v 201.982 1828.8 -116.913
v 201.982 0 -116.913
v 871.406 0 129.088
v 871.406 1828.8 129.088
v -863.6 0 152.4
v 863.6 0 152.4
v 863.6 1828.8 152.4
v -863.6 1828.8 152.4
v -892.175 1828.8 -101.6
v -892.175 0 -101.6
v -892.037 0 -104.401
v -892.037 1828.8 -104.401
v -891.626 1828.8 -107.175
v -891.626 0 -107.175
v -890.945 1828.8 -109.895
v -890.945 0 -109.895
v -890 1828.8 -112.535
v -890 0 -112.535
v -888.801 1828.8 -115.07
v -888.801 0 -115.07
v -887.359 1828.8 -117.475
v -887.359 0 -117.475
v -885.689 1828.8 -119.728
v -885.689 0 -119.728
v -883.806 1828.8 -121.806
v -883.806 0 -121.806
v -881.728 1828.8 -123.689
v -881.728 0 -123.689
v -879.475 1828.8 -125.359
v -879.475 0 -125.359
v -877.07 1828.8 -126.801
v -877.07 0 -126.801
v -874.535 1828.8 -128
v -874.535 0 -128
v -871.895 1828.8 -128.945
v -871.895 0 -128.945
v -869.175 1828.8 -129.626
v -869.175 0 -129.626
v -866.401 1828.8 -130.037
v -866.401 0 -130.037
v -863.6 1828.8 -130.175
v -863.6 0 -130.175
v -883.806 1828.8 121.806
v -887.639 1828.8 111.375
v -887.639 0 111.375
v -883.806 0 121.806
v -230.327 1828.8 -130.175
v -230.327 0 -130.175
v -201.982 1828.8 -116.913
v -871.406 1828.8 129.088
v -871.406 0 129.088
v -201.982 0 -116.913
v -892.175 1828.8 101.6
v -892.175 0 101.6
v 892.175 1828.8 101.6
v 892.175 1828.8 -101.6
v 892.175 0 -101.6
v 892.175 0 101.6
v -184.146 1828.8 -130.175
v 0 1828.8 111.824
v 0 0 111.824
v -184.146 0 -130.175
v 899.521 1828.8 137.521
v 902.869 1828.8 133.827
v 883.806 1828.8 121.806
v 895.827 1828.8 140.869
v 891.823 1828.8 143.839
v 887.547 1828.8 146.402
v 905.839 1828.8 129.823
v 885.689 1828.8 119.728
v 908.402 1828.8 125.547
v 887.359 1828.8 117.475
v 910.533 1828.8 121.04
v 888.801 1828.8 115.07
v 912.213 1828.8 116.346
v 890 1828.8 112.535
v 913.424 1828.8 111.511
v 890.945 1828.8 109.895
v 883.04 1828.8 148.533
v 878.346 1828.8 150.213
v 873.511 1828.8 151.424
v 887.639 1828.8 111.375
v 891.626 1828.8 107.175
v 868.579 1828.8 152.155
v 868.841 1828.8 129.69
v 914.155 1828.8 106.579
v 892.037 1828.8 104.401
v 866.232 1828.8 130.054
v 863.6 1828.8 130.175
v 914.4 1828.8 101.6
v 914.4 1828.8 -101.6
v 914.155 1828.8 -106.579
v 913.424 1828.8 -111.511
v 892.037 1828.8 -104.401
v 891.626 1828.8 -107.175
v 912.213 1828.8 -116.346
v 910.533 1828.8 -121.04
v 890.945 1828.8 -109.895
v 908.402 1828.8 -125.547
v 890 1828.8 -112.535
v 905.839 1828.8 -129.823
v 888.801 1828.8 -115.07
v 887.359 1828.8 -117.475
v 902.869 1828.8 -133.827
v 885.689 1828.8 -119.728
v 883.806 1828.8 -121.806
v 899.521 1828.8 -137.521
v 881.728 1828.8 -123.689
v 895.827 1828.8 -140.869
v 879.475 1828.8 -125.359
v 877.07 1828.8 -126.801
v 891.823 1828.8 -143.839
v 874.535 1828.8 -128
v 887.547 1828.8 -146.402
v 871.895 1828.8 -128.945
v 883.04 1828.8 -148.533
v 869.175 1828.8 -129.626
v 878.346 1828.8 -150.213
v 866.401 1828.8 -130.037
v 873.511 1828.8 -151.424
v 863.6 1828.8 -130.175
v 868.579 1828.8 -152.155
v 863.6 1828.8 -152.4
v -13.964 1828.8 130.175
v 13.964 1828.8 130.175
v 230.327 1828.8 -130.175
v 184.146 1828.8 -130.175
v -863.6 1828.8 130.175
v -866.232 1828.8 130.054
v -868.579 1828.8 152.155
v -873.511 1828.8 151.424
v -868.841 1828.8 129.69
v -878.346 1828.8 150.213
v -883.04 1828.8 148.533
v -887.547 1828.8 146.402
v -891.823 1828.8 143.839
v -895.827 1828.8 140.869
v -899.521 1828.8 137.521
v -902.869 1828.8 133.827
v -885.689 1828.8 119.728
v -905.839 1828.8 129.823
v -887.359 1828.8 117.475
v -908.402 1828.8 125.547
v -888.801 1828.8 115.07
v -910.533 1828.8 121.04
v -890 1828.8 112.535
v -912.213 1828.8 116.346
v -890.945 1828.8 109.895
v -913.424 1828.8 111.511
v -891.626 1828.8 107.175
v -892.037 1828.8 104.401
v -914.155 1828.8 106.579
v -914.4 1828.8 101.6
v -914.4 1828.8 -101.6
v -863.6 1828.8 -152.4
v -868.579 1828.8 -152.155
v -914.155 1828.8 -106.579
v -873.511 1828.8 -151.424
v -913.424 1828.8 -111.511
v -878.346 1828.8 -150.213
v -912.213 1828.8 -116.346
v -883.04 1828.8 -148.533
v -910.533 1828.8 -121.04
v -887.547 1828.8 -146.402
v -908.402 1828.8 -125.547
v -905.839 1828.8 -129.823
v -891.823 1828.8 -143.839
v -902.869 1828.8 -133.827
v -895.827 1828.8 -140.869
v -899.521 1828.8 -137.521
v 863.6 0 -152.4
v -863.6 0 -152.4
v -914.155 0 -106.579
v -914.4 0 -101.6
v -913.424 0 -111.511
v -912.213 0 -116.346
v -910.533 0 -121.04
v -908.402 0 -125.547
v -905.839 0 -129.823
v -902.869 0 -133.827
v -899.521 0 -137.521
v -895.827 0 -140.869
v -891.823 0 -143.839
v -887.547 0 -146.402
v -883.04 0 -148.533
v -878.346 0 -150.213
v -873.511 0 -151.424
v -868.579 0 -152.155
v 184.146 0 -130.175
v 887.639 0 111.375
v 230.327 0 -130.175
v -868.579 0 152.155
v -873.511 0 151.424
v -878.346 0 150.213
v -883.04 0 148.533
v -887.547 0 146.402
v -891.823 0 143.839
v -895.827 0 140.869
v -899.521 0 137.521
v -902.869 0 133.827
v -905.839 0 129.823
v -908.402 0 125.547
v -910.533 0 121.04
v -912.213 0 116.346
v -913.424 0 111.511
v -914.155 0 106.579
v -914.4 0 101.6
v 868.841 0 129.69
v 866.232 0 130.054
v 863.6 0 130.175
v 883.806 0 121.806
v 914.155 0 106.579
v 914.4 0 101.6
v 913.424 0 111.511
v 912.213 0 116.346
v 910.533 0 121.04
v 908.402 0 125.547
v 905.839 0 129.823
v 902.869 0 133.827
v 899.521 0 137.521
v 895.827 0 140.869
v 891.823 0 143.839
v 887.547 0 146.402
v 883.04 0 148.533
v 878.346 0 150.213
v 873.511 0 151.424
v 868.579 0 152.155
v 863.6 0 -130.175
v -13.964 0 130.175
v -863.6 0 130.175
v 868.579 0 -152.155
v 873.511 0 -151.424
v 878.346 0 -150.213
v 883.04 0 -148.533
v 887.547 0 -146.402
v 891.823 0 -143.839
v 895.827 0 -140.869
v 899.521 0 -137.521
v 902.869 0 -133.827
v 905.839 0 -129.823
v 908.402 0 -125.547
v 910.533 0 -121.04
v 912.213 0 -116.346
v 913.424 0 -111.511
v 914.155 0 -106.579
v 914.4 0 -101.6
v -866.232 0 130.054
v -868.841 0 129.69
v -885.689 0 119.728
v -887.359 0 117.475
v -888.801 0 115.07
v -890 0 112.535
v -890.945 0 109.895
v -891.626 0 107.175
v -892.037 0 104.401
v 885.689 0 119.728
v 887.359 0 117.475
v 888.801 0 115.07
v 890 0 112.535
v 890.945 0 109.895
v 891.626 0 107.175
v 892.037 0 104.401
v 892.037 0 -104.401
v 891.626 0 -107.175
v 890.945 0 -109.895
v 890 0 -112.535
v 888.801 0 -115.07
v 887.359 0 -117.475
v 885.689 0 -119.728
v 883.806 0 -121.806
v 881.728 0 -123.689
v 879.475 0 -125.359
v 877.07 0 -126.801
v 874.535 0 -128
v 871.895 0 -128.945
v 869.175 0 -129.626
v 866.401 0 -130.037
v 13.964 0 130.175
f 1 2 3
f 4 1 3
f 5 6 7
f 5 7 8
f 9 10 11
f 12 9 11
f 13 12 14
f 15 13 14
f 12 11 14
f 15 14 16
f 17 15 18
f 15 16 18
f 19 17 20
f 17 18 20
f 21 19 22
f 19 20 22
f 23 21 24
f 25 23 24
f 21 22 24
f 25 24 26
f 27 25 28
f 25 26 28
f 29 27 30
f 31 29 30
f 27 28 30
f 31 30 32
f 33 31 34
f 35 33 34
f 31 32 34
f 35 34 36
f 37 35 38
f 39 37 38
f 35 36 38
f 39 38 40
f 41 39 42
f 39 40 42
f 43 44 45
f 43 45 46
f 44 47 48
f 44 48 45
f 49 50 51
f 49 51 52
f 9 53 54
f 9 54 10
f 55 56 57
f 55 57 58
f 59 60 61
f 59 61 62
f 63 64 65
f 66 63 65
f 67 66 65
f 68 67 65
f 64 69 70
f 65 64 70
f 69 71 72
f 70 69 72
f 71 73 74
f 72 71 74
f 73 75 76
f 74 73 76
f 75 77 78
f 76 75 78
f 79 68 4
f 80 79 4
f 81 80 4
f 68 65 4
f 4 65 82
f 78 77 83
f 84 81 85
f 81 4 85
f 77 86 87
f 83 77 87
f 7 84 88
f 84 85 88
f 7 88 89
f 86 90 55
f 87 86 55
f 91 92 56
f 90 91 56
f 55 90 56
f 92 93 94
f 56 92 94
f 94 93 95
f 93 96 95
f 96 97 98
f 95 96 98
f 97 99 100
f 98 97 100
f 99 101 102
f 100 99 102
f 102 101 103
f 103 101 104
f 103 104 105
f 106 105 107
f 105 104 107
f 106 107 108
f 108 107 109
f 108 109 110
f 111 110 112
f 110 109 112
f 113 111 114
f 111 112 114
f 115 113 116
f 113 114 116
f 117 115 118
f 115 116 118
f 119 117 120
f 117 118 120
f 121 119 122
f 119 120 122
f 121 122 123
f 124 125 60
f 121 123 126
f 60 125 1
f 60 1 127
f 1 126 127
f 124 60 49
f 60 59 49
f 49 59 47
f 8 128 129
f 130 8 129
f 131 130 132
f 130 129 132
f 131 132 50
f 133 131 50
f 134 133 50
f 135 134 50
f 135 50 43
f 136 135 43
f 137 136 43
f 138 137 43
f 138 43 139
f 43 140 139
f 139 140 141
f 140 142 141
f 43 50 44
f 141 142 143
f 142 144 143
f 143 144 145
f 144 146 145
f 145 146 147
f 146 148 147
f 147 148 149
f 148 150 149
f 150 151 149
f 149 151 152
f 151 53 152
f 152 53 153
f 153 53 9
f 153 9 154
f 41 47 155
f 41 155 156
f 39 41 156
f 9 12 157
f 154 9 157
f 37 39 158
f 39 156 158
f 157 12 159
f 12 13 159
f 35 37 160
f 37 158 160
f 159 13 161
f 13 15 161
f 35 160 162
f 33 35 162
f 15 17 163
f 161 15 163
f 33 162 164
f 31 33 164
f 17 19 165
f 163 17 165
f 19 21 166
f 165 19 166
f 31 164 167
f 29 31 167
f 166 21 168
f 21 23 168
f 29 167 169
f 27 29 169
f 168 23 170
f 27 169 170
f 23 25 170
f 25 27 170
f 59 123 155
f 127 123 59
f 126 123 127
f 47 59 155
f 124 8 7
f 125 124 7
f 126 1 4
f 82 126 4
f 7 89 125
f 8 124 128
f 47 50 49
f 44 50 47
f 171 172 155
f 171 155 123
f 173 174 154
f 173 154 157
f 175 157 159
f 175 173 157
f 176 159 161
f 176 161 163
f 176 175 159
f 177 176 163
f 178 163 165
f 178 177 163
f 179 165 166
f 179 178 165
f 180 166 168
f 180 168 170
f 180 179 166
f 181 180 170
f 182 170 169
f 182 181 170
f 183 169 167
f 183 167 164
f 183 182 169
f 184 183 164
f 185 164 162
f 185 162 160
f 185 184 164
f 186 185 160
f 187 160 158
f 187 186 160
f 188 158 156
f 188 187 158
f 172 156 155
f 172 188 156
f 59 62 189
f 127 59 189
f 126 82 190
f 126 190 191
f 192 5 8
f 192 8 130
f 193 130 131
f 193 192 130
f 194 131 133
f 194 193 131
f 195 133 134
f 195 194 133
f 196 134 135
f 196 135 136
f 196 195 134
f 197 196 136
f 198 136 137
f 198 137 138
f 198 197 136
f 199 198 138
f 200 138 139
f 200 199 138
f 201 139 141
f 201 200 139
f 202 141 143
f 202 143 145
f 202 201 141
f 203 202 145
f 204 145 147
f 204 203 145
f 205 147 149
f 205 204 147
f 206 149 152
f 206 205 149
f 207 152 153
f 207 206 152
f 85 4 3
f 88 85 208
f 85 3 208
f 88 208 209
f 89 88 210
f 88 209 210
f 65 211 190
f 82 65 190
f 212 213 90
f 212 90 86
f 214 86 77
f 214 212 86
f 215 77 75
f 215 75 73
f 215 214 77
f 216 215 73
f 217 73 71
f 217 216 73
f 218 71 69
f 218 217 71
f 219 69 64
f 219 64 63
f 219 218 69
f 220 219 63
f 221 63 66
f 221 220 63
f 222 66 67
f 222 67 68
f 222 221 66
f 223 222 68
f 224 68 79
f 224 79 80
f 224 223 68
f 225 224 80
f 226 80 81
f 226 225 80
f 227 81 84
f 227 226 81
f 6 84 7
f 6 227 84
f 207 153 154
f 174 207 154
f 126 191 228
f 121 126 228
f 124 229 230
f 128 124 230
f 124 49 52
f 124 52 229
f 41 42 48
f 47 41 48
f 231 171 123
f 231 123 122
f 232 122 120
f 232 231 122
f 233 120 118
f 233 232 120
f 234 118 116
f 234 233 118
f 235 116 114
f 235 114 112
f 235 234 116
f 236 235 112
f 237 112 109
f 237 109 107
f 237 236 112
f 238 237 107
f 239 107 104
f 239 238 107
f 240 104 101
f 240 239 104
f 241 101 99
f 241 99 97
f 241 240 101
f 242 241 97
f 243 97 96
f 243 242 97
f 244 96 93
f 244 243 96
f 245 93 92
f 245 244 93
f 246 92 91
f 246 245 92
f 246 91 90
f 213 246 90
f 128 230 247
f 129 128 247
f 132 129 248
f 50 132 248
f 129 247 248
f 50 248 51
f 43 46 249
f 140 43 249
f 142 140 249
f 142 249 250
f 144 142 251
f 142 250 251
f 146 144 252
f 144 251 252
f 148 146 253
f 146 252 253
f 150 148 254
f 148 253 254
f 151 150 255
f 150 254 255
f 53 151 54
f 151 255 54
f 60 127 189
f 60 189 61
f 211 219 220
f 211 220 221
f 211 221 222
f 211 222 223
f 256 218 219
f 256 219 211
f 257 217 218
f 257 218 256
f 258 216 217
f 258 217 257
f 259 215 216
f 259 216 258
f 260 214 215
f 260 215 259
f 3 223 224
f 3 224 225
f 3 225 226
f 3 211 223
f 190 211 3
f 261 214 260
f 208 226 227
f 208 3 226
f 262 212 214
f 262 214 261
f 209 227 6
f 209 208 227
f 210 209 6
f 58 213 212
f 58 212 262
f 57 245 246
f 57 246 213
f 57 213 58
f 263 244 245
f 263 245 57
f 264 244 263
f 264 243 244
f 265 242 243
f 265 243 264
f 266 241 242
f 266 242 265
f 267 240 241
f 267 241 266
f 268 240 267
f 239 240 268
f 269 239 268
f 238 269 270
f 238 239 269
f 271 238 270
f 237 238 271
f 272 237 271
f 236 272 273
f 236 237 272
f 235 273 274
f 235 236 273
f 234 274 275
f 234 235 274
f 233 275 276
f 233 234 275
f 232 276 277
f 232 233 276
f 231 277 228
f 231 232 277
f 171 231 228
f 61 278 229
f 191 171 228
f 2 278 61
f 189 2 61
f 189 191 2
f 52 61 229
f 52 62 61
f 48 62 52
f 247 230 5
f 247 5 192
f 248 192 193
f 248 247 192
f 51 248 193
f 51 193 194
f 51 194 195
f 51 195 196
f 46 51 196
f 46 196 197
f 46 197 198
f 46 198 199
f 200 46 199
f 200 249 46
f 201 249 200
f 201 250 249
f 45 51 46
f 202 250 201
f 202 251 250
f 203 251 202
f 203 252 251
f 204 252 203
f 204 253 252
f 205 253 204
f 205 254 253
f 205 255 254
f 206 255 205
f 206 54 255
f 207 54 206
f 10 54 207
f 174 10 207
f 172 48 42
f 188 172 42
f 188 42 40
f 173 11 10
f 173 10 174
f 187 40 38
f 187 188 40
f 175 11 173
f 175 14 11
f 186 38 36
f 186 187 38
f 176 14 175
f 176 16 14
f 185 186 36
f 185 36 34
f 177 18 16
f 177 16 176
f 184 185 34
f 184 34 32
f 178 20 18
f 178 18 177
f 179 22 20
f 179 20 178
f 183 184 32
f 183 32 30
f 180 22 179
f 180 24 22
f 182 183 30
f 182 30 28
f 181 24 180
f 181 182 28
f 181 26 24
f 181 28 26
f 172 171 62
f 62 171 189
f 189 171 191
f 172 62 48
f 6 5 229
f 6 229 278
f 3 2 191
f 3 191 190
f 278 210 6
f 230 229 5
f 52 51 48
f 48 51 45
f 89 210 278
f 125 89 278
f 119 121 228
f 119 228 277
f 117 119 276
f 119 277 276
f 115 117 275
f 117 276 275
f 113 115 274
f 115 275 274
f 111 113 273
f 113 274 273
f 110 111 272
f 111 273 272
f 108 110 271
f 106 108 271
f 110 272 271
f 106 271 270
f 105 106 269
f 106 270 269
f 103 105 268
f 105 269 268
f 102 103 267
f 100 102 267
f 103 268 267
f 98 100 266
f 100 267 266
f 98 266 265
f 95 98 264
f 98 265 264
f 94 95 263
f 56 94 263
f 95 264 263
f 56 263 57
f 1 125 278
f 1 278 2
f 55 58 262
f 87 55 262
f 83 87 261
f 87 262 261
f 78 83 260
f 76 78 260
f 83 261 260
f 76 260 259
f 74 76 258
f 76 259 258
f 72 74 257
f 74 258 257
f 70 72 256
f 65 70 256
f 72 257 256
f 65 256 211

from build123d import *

# Parameters (mm, degrees)
EXTRUDE_THIN1_DEPTH = 1828.8
EXTRUDE_THIN3_DEPTH = 1828.8


with BuildPart() as part:
    # Sketch1 → Extrude-Thin1 (new body)
    with BuildSketch(Plane(origin=(0, 0, 0), x_dir=(1, 0, 0), z_dir=(0, 1, 0))):
        with BuildLine():
            Line((-863.6, 152.4), (863.6, 152.4))
            ThreePointArc((863.6, 152.4), (899.521024484, 137.521024484), (914.4, 101.6))
            Line((914.4, 101.6), (914.4, -101.6))
            ThreePointArc((914.4, -101.6), (899.521024484, -137.521024484), (863.6, -152.4))
            Line((863.6, -152.4), (-863.6, -152.4))
            ThreePointArc((-863.6, -152.4), (-899.521024484, -137.521024484), (-914.4, -101.6))
            Line((-914.4, -101.6), (-914.4, 101.6))
            ThreePointArc((-914.4, 101.6), (-899.521024484, 137.521024484), (-863.6, 152.4))
        make_face()
        with BuildLine():
            Line((-863.6, 130.175), (863.6, 130.175))
            ThreePointArc((863.6, 130.175), (883.805576272, 121.805576272), (892.175, 101.6))
            Line((892.175, 101.6), (892.175, -101.6))
            ThreePointArc((892.175, -101.6), (883.805576272, -121.805576272), (863.6, -130.175))
            Line((863.6, -130.175), (-863.6, -130.175))
            ThreePointArc((-863.6, -130.175), (-883.805576272, -121.805576272), (-892.175, -101.6))
            Line((-892.175, -101.6), (-892.175, 101.6))
            ThreePointArc((-892.175, 101.6), (-883.805576272, 121.805576272), (-863.6, 130.175))
        make_face(mode=Mode.SUBTRACT)
    extrude(amount=EXTRUDE_THIN1_DEPTH)

    # Sketch2 → Extrude-Thin3 (add)
    with BuildSketch(Plane(origin=(0, 1828.8, 0), x_dir=(1, 0, 0), z_dir=(0, 1, 0))):
        Polygon((-879.97255462, -132.236089264), (-201.982109296, 116.912927618), (0, -148.525916816), (201.982109296, 116.912927618), (879.97255462, -132.236089264), (887.638597925, -111.375063281), (194.237534197, 143.437072382), (0, -111.824083184), (-194.237534197, 143.437072382), (-887.638597925, -111.375063281), align=None)
    extrude(amount=-EXTRUDE_THIN3_DEPTH)


solid = part.part
